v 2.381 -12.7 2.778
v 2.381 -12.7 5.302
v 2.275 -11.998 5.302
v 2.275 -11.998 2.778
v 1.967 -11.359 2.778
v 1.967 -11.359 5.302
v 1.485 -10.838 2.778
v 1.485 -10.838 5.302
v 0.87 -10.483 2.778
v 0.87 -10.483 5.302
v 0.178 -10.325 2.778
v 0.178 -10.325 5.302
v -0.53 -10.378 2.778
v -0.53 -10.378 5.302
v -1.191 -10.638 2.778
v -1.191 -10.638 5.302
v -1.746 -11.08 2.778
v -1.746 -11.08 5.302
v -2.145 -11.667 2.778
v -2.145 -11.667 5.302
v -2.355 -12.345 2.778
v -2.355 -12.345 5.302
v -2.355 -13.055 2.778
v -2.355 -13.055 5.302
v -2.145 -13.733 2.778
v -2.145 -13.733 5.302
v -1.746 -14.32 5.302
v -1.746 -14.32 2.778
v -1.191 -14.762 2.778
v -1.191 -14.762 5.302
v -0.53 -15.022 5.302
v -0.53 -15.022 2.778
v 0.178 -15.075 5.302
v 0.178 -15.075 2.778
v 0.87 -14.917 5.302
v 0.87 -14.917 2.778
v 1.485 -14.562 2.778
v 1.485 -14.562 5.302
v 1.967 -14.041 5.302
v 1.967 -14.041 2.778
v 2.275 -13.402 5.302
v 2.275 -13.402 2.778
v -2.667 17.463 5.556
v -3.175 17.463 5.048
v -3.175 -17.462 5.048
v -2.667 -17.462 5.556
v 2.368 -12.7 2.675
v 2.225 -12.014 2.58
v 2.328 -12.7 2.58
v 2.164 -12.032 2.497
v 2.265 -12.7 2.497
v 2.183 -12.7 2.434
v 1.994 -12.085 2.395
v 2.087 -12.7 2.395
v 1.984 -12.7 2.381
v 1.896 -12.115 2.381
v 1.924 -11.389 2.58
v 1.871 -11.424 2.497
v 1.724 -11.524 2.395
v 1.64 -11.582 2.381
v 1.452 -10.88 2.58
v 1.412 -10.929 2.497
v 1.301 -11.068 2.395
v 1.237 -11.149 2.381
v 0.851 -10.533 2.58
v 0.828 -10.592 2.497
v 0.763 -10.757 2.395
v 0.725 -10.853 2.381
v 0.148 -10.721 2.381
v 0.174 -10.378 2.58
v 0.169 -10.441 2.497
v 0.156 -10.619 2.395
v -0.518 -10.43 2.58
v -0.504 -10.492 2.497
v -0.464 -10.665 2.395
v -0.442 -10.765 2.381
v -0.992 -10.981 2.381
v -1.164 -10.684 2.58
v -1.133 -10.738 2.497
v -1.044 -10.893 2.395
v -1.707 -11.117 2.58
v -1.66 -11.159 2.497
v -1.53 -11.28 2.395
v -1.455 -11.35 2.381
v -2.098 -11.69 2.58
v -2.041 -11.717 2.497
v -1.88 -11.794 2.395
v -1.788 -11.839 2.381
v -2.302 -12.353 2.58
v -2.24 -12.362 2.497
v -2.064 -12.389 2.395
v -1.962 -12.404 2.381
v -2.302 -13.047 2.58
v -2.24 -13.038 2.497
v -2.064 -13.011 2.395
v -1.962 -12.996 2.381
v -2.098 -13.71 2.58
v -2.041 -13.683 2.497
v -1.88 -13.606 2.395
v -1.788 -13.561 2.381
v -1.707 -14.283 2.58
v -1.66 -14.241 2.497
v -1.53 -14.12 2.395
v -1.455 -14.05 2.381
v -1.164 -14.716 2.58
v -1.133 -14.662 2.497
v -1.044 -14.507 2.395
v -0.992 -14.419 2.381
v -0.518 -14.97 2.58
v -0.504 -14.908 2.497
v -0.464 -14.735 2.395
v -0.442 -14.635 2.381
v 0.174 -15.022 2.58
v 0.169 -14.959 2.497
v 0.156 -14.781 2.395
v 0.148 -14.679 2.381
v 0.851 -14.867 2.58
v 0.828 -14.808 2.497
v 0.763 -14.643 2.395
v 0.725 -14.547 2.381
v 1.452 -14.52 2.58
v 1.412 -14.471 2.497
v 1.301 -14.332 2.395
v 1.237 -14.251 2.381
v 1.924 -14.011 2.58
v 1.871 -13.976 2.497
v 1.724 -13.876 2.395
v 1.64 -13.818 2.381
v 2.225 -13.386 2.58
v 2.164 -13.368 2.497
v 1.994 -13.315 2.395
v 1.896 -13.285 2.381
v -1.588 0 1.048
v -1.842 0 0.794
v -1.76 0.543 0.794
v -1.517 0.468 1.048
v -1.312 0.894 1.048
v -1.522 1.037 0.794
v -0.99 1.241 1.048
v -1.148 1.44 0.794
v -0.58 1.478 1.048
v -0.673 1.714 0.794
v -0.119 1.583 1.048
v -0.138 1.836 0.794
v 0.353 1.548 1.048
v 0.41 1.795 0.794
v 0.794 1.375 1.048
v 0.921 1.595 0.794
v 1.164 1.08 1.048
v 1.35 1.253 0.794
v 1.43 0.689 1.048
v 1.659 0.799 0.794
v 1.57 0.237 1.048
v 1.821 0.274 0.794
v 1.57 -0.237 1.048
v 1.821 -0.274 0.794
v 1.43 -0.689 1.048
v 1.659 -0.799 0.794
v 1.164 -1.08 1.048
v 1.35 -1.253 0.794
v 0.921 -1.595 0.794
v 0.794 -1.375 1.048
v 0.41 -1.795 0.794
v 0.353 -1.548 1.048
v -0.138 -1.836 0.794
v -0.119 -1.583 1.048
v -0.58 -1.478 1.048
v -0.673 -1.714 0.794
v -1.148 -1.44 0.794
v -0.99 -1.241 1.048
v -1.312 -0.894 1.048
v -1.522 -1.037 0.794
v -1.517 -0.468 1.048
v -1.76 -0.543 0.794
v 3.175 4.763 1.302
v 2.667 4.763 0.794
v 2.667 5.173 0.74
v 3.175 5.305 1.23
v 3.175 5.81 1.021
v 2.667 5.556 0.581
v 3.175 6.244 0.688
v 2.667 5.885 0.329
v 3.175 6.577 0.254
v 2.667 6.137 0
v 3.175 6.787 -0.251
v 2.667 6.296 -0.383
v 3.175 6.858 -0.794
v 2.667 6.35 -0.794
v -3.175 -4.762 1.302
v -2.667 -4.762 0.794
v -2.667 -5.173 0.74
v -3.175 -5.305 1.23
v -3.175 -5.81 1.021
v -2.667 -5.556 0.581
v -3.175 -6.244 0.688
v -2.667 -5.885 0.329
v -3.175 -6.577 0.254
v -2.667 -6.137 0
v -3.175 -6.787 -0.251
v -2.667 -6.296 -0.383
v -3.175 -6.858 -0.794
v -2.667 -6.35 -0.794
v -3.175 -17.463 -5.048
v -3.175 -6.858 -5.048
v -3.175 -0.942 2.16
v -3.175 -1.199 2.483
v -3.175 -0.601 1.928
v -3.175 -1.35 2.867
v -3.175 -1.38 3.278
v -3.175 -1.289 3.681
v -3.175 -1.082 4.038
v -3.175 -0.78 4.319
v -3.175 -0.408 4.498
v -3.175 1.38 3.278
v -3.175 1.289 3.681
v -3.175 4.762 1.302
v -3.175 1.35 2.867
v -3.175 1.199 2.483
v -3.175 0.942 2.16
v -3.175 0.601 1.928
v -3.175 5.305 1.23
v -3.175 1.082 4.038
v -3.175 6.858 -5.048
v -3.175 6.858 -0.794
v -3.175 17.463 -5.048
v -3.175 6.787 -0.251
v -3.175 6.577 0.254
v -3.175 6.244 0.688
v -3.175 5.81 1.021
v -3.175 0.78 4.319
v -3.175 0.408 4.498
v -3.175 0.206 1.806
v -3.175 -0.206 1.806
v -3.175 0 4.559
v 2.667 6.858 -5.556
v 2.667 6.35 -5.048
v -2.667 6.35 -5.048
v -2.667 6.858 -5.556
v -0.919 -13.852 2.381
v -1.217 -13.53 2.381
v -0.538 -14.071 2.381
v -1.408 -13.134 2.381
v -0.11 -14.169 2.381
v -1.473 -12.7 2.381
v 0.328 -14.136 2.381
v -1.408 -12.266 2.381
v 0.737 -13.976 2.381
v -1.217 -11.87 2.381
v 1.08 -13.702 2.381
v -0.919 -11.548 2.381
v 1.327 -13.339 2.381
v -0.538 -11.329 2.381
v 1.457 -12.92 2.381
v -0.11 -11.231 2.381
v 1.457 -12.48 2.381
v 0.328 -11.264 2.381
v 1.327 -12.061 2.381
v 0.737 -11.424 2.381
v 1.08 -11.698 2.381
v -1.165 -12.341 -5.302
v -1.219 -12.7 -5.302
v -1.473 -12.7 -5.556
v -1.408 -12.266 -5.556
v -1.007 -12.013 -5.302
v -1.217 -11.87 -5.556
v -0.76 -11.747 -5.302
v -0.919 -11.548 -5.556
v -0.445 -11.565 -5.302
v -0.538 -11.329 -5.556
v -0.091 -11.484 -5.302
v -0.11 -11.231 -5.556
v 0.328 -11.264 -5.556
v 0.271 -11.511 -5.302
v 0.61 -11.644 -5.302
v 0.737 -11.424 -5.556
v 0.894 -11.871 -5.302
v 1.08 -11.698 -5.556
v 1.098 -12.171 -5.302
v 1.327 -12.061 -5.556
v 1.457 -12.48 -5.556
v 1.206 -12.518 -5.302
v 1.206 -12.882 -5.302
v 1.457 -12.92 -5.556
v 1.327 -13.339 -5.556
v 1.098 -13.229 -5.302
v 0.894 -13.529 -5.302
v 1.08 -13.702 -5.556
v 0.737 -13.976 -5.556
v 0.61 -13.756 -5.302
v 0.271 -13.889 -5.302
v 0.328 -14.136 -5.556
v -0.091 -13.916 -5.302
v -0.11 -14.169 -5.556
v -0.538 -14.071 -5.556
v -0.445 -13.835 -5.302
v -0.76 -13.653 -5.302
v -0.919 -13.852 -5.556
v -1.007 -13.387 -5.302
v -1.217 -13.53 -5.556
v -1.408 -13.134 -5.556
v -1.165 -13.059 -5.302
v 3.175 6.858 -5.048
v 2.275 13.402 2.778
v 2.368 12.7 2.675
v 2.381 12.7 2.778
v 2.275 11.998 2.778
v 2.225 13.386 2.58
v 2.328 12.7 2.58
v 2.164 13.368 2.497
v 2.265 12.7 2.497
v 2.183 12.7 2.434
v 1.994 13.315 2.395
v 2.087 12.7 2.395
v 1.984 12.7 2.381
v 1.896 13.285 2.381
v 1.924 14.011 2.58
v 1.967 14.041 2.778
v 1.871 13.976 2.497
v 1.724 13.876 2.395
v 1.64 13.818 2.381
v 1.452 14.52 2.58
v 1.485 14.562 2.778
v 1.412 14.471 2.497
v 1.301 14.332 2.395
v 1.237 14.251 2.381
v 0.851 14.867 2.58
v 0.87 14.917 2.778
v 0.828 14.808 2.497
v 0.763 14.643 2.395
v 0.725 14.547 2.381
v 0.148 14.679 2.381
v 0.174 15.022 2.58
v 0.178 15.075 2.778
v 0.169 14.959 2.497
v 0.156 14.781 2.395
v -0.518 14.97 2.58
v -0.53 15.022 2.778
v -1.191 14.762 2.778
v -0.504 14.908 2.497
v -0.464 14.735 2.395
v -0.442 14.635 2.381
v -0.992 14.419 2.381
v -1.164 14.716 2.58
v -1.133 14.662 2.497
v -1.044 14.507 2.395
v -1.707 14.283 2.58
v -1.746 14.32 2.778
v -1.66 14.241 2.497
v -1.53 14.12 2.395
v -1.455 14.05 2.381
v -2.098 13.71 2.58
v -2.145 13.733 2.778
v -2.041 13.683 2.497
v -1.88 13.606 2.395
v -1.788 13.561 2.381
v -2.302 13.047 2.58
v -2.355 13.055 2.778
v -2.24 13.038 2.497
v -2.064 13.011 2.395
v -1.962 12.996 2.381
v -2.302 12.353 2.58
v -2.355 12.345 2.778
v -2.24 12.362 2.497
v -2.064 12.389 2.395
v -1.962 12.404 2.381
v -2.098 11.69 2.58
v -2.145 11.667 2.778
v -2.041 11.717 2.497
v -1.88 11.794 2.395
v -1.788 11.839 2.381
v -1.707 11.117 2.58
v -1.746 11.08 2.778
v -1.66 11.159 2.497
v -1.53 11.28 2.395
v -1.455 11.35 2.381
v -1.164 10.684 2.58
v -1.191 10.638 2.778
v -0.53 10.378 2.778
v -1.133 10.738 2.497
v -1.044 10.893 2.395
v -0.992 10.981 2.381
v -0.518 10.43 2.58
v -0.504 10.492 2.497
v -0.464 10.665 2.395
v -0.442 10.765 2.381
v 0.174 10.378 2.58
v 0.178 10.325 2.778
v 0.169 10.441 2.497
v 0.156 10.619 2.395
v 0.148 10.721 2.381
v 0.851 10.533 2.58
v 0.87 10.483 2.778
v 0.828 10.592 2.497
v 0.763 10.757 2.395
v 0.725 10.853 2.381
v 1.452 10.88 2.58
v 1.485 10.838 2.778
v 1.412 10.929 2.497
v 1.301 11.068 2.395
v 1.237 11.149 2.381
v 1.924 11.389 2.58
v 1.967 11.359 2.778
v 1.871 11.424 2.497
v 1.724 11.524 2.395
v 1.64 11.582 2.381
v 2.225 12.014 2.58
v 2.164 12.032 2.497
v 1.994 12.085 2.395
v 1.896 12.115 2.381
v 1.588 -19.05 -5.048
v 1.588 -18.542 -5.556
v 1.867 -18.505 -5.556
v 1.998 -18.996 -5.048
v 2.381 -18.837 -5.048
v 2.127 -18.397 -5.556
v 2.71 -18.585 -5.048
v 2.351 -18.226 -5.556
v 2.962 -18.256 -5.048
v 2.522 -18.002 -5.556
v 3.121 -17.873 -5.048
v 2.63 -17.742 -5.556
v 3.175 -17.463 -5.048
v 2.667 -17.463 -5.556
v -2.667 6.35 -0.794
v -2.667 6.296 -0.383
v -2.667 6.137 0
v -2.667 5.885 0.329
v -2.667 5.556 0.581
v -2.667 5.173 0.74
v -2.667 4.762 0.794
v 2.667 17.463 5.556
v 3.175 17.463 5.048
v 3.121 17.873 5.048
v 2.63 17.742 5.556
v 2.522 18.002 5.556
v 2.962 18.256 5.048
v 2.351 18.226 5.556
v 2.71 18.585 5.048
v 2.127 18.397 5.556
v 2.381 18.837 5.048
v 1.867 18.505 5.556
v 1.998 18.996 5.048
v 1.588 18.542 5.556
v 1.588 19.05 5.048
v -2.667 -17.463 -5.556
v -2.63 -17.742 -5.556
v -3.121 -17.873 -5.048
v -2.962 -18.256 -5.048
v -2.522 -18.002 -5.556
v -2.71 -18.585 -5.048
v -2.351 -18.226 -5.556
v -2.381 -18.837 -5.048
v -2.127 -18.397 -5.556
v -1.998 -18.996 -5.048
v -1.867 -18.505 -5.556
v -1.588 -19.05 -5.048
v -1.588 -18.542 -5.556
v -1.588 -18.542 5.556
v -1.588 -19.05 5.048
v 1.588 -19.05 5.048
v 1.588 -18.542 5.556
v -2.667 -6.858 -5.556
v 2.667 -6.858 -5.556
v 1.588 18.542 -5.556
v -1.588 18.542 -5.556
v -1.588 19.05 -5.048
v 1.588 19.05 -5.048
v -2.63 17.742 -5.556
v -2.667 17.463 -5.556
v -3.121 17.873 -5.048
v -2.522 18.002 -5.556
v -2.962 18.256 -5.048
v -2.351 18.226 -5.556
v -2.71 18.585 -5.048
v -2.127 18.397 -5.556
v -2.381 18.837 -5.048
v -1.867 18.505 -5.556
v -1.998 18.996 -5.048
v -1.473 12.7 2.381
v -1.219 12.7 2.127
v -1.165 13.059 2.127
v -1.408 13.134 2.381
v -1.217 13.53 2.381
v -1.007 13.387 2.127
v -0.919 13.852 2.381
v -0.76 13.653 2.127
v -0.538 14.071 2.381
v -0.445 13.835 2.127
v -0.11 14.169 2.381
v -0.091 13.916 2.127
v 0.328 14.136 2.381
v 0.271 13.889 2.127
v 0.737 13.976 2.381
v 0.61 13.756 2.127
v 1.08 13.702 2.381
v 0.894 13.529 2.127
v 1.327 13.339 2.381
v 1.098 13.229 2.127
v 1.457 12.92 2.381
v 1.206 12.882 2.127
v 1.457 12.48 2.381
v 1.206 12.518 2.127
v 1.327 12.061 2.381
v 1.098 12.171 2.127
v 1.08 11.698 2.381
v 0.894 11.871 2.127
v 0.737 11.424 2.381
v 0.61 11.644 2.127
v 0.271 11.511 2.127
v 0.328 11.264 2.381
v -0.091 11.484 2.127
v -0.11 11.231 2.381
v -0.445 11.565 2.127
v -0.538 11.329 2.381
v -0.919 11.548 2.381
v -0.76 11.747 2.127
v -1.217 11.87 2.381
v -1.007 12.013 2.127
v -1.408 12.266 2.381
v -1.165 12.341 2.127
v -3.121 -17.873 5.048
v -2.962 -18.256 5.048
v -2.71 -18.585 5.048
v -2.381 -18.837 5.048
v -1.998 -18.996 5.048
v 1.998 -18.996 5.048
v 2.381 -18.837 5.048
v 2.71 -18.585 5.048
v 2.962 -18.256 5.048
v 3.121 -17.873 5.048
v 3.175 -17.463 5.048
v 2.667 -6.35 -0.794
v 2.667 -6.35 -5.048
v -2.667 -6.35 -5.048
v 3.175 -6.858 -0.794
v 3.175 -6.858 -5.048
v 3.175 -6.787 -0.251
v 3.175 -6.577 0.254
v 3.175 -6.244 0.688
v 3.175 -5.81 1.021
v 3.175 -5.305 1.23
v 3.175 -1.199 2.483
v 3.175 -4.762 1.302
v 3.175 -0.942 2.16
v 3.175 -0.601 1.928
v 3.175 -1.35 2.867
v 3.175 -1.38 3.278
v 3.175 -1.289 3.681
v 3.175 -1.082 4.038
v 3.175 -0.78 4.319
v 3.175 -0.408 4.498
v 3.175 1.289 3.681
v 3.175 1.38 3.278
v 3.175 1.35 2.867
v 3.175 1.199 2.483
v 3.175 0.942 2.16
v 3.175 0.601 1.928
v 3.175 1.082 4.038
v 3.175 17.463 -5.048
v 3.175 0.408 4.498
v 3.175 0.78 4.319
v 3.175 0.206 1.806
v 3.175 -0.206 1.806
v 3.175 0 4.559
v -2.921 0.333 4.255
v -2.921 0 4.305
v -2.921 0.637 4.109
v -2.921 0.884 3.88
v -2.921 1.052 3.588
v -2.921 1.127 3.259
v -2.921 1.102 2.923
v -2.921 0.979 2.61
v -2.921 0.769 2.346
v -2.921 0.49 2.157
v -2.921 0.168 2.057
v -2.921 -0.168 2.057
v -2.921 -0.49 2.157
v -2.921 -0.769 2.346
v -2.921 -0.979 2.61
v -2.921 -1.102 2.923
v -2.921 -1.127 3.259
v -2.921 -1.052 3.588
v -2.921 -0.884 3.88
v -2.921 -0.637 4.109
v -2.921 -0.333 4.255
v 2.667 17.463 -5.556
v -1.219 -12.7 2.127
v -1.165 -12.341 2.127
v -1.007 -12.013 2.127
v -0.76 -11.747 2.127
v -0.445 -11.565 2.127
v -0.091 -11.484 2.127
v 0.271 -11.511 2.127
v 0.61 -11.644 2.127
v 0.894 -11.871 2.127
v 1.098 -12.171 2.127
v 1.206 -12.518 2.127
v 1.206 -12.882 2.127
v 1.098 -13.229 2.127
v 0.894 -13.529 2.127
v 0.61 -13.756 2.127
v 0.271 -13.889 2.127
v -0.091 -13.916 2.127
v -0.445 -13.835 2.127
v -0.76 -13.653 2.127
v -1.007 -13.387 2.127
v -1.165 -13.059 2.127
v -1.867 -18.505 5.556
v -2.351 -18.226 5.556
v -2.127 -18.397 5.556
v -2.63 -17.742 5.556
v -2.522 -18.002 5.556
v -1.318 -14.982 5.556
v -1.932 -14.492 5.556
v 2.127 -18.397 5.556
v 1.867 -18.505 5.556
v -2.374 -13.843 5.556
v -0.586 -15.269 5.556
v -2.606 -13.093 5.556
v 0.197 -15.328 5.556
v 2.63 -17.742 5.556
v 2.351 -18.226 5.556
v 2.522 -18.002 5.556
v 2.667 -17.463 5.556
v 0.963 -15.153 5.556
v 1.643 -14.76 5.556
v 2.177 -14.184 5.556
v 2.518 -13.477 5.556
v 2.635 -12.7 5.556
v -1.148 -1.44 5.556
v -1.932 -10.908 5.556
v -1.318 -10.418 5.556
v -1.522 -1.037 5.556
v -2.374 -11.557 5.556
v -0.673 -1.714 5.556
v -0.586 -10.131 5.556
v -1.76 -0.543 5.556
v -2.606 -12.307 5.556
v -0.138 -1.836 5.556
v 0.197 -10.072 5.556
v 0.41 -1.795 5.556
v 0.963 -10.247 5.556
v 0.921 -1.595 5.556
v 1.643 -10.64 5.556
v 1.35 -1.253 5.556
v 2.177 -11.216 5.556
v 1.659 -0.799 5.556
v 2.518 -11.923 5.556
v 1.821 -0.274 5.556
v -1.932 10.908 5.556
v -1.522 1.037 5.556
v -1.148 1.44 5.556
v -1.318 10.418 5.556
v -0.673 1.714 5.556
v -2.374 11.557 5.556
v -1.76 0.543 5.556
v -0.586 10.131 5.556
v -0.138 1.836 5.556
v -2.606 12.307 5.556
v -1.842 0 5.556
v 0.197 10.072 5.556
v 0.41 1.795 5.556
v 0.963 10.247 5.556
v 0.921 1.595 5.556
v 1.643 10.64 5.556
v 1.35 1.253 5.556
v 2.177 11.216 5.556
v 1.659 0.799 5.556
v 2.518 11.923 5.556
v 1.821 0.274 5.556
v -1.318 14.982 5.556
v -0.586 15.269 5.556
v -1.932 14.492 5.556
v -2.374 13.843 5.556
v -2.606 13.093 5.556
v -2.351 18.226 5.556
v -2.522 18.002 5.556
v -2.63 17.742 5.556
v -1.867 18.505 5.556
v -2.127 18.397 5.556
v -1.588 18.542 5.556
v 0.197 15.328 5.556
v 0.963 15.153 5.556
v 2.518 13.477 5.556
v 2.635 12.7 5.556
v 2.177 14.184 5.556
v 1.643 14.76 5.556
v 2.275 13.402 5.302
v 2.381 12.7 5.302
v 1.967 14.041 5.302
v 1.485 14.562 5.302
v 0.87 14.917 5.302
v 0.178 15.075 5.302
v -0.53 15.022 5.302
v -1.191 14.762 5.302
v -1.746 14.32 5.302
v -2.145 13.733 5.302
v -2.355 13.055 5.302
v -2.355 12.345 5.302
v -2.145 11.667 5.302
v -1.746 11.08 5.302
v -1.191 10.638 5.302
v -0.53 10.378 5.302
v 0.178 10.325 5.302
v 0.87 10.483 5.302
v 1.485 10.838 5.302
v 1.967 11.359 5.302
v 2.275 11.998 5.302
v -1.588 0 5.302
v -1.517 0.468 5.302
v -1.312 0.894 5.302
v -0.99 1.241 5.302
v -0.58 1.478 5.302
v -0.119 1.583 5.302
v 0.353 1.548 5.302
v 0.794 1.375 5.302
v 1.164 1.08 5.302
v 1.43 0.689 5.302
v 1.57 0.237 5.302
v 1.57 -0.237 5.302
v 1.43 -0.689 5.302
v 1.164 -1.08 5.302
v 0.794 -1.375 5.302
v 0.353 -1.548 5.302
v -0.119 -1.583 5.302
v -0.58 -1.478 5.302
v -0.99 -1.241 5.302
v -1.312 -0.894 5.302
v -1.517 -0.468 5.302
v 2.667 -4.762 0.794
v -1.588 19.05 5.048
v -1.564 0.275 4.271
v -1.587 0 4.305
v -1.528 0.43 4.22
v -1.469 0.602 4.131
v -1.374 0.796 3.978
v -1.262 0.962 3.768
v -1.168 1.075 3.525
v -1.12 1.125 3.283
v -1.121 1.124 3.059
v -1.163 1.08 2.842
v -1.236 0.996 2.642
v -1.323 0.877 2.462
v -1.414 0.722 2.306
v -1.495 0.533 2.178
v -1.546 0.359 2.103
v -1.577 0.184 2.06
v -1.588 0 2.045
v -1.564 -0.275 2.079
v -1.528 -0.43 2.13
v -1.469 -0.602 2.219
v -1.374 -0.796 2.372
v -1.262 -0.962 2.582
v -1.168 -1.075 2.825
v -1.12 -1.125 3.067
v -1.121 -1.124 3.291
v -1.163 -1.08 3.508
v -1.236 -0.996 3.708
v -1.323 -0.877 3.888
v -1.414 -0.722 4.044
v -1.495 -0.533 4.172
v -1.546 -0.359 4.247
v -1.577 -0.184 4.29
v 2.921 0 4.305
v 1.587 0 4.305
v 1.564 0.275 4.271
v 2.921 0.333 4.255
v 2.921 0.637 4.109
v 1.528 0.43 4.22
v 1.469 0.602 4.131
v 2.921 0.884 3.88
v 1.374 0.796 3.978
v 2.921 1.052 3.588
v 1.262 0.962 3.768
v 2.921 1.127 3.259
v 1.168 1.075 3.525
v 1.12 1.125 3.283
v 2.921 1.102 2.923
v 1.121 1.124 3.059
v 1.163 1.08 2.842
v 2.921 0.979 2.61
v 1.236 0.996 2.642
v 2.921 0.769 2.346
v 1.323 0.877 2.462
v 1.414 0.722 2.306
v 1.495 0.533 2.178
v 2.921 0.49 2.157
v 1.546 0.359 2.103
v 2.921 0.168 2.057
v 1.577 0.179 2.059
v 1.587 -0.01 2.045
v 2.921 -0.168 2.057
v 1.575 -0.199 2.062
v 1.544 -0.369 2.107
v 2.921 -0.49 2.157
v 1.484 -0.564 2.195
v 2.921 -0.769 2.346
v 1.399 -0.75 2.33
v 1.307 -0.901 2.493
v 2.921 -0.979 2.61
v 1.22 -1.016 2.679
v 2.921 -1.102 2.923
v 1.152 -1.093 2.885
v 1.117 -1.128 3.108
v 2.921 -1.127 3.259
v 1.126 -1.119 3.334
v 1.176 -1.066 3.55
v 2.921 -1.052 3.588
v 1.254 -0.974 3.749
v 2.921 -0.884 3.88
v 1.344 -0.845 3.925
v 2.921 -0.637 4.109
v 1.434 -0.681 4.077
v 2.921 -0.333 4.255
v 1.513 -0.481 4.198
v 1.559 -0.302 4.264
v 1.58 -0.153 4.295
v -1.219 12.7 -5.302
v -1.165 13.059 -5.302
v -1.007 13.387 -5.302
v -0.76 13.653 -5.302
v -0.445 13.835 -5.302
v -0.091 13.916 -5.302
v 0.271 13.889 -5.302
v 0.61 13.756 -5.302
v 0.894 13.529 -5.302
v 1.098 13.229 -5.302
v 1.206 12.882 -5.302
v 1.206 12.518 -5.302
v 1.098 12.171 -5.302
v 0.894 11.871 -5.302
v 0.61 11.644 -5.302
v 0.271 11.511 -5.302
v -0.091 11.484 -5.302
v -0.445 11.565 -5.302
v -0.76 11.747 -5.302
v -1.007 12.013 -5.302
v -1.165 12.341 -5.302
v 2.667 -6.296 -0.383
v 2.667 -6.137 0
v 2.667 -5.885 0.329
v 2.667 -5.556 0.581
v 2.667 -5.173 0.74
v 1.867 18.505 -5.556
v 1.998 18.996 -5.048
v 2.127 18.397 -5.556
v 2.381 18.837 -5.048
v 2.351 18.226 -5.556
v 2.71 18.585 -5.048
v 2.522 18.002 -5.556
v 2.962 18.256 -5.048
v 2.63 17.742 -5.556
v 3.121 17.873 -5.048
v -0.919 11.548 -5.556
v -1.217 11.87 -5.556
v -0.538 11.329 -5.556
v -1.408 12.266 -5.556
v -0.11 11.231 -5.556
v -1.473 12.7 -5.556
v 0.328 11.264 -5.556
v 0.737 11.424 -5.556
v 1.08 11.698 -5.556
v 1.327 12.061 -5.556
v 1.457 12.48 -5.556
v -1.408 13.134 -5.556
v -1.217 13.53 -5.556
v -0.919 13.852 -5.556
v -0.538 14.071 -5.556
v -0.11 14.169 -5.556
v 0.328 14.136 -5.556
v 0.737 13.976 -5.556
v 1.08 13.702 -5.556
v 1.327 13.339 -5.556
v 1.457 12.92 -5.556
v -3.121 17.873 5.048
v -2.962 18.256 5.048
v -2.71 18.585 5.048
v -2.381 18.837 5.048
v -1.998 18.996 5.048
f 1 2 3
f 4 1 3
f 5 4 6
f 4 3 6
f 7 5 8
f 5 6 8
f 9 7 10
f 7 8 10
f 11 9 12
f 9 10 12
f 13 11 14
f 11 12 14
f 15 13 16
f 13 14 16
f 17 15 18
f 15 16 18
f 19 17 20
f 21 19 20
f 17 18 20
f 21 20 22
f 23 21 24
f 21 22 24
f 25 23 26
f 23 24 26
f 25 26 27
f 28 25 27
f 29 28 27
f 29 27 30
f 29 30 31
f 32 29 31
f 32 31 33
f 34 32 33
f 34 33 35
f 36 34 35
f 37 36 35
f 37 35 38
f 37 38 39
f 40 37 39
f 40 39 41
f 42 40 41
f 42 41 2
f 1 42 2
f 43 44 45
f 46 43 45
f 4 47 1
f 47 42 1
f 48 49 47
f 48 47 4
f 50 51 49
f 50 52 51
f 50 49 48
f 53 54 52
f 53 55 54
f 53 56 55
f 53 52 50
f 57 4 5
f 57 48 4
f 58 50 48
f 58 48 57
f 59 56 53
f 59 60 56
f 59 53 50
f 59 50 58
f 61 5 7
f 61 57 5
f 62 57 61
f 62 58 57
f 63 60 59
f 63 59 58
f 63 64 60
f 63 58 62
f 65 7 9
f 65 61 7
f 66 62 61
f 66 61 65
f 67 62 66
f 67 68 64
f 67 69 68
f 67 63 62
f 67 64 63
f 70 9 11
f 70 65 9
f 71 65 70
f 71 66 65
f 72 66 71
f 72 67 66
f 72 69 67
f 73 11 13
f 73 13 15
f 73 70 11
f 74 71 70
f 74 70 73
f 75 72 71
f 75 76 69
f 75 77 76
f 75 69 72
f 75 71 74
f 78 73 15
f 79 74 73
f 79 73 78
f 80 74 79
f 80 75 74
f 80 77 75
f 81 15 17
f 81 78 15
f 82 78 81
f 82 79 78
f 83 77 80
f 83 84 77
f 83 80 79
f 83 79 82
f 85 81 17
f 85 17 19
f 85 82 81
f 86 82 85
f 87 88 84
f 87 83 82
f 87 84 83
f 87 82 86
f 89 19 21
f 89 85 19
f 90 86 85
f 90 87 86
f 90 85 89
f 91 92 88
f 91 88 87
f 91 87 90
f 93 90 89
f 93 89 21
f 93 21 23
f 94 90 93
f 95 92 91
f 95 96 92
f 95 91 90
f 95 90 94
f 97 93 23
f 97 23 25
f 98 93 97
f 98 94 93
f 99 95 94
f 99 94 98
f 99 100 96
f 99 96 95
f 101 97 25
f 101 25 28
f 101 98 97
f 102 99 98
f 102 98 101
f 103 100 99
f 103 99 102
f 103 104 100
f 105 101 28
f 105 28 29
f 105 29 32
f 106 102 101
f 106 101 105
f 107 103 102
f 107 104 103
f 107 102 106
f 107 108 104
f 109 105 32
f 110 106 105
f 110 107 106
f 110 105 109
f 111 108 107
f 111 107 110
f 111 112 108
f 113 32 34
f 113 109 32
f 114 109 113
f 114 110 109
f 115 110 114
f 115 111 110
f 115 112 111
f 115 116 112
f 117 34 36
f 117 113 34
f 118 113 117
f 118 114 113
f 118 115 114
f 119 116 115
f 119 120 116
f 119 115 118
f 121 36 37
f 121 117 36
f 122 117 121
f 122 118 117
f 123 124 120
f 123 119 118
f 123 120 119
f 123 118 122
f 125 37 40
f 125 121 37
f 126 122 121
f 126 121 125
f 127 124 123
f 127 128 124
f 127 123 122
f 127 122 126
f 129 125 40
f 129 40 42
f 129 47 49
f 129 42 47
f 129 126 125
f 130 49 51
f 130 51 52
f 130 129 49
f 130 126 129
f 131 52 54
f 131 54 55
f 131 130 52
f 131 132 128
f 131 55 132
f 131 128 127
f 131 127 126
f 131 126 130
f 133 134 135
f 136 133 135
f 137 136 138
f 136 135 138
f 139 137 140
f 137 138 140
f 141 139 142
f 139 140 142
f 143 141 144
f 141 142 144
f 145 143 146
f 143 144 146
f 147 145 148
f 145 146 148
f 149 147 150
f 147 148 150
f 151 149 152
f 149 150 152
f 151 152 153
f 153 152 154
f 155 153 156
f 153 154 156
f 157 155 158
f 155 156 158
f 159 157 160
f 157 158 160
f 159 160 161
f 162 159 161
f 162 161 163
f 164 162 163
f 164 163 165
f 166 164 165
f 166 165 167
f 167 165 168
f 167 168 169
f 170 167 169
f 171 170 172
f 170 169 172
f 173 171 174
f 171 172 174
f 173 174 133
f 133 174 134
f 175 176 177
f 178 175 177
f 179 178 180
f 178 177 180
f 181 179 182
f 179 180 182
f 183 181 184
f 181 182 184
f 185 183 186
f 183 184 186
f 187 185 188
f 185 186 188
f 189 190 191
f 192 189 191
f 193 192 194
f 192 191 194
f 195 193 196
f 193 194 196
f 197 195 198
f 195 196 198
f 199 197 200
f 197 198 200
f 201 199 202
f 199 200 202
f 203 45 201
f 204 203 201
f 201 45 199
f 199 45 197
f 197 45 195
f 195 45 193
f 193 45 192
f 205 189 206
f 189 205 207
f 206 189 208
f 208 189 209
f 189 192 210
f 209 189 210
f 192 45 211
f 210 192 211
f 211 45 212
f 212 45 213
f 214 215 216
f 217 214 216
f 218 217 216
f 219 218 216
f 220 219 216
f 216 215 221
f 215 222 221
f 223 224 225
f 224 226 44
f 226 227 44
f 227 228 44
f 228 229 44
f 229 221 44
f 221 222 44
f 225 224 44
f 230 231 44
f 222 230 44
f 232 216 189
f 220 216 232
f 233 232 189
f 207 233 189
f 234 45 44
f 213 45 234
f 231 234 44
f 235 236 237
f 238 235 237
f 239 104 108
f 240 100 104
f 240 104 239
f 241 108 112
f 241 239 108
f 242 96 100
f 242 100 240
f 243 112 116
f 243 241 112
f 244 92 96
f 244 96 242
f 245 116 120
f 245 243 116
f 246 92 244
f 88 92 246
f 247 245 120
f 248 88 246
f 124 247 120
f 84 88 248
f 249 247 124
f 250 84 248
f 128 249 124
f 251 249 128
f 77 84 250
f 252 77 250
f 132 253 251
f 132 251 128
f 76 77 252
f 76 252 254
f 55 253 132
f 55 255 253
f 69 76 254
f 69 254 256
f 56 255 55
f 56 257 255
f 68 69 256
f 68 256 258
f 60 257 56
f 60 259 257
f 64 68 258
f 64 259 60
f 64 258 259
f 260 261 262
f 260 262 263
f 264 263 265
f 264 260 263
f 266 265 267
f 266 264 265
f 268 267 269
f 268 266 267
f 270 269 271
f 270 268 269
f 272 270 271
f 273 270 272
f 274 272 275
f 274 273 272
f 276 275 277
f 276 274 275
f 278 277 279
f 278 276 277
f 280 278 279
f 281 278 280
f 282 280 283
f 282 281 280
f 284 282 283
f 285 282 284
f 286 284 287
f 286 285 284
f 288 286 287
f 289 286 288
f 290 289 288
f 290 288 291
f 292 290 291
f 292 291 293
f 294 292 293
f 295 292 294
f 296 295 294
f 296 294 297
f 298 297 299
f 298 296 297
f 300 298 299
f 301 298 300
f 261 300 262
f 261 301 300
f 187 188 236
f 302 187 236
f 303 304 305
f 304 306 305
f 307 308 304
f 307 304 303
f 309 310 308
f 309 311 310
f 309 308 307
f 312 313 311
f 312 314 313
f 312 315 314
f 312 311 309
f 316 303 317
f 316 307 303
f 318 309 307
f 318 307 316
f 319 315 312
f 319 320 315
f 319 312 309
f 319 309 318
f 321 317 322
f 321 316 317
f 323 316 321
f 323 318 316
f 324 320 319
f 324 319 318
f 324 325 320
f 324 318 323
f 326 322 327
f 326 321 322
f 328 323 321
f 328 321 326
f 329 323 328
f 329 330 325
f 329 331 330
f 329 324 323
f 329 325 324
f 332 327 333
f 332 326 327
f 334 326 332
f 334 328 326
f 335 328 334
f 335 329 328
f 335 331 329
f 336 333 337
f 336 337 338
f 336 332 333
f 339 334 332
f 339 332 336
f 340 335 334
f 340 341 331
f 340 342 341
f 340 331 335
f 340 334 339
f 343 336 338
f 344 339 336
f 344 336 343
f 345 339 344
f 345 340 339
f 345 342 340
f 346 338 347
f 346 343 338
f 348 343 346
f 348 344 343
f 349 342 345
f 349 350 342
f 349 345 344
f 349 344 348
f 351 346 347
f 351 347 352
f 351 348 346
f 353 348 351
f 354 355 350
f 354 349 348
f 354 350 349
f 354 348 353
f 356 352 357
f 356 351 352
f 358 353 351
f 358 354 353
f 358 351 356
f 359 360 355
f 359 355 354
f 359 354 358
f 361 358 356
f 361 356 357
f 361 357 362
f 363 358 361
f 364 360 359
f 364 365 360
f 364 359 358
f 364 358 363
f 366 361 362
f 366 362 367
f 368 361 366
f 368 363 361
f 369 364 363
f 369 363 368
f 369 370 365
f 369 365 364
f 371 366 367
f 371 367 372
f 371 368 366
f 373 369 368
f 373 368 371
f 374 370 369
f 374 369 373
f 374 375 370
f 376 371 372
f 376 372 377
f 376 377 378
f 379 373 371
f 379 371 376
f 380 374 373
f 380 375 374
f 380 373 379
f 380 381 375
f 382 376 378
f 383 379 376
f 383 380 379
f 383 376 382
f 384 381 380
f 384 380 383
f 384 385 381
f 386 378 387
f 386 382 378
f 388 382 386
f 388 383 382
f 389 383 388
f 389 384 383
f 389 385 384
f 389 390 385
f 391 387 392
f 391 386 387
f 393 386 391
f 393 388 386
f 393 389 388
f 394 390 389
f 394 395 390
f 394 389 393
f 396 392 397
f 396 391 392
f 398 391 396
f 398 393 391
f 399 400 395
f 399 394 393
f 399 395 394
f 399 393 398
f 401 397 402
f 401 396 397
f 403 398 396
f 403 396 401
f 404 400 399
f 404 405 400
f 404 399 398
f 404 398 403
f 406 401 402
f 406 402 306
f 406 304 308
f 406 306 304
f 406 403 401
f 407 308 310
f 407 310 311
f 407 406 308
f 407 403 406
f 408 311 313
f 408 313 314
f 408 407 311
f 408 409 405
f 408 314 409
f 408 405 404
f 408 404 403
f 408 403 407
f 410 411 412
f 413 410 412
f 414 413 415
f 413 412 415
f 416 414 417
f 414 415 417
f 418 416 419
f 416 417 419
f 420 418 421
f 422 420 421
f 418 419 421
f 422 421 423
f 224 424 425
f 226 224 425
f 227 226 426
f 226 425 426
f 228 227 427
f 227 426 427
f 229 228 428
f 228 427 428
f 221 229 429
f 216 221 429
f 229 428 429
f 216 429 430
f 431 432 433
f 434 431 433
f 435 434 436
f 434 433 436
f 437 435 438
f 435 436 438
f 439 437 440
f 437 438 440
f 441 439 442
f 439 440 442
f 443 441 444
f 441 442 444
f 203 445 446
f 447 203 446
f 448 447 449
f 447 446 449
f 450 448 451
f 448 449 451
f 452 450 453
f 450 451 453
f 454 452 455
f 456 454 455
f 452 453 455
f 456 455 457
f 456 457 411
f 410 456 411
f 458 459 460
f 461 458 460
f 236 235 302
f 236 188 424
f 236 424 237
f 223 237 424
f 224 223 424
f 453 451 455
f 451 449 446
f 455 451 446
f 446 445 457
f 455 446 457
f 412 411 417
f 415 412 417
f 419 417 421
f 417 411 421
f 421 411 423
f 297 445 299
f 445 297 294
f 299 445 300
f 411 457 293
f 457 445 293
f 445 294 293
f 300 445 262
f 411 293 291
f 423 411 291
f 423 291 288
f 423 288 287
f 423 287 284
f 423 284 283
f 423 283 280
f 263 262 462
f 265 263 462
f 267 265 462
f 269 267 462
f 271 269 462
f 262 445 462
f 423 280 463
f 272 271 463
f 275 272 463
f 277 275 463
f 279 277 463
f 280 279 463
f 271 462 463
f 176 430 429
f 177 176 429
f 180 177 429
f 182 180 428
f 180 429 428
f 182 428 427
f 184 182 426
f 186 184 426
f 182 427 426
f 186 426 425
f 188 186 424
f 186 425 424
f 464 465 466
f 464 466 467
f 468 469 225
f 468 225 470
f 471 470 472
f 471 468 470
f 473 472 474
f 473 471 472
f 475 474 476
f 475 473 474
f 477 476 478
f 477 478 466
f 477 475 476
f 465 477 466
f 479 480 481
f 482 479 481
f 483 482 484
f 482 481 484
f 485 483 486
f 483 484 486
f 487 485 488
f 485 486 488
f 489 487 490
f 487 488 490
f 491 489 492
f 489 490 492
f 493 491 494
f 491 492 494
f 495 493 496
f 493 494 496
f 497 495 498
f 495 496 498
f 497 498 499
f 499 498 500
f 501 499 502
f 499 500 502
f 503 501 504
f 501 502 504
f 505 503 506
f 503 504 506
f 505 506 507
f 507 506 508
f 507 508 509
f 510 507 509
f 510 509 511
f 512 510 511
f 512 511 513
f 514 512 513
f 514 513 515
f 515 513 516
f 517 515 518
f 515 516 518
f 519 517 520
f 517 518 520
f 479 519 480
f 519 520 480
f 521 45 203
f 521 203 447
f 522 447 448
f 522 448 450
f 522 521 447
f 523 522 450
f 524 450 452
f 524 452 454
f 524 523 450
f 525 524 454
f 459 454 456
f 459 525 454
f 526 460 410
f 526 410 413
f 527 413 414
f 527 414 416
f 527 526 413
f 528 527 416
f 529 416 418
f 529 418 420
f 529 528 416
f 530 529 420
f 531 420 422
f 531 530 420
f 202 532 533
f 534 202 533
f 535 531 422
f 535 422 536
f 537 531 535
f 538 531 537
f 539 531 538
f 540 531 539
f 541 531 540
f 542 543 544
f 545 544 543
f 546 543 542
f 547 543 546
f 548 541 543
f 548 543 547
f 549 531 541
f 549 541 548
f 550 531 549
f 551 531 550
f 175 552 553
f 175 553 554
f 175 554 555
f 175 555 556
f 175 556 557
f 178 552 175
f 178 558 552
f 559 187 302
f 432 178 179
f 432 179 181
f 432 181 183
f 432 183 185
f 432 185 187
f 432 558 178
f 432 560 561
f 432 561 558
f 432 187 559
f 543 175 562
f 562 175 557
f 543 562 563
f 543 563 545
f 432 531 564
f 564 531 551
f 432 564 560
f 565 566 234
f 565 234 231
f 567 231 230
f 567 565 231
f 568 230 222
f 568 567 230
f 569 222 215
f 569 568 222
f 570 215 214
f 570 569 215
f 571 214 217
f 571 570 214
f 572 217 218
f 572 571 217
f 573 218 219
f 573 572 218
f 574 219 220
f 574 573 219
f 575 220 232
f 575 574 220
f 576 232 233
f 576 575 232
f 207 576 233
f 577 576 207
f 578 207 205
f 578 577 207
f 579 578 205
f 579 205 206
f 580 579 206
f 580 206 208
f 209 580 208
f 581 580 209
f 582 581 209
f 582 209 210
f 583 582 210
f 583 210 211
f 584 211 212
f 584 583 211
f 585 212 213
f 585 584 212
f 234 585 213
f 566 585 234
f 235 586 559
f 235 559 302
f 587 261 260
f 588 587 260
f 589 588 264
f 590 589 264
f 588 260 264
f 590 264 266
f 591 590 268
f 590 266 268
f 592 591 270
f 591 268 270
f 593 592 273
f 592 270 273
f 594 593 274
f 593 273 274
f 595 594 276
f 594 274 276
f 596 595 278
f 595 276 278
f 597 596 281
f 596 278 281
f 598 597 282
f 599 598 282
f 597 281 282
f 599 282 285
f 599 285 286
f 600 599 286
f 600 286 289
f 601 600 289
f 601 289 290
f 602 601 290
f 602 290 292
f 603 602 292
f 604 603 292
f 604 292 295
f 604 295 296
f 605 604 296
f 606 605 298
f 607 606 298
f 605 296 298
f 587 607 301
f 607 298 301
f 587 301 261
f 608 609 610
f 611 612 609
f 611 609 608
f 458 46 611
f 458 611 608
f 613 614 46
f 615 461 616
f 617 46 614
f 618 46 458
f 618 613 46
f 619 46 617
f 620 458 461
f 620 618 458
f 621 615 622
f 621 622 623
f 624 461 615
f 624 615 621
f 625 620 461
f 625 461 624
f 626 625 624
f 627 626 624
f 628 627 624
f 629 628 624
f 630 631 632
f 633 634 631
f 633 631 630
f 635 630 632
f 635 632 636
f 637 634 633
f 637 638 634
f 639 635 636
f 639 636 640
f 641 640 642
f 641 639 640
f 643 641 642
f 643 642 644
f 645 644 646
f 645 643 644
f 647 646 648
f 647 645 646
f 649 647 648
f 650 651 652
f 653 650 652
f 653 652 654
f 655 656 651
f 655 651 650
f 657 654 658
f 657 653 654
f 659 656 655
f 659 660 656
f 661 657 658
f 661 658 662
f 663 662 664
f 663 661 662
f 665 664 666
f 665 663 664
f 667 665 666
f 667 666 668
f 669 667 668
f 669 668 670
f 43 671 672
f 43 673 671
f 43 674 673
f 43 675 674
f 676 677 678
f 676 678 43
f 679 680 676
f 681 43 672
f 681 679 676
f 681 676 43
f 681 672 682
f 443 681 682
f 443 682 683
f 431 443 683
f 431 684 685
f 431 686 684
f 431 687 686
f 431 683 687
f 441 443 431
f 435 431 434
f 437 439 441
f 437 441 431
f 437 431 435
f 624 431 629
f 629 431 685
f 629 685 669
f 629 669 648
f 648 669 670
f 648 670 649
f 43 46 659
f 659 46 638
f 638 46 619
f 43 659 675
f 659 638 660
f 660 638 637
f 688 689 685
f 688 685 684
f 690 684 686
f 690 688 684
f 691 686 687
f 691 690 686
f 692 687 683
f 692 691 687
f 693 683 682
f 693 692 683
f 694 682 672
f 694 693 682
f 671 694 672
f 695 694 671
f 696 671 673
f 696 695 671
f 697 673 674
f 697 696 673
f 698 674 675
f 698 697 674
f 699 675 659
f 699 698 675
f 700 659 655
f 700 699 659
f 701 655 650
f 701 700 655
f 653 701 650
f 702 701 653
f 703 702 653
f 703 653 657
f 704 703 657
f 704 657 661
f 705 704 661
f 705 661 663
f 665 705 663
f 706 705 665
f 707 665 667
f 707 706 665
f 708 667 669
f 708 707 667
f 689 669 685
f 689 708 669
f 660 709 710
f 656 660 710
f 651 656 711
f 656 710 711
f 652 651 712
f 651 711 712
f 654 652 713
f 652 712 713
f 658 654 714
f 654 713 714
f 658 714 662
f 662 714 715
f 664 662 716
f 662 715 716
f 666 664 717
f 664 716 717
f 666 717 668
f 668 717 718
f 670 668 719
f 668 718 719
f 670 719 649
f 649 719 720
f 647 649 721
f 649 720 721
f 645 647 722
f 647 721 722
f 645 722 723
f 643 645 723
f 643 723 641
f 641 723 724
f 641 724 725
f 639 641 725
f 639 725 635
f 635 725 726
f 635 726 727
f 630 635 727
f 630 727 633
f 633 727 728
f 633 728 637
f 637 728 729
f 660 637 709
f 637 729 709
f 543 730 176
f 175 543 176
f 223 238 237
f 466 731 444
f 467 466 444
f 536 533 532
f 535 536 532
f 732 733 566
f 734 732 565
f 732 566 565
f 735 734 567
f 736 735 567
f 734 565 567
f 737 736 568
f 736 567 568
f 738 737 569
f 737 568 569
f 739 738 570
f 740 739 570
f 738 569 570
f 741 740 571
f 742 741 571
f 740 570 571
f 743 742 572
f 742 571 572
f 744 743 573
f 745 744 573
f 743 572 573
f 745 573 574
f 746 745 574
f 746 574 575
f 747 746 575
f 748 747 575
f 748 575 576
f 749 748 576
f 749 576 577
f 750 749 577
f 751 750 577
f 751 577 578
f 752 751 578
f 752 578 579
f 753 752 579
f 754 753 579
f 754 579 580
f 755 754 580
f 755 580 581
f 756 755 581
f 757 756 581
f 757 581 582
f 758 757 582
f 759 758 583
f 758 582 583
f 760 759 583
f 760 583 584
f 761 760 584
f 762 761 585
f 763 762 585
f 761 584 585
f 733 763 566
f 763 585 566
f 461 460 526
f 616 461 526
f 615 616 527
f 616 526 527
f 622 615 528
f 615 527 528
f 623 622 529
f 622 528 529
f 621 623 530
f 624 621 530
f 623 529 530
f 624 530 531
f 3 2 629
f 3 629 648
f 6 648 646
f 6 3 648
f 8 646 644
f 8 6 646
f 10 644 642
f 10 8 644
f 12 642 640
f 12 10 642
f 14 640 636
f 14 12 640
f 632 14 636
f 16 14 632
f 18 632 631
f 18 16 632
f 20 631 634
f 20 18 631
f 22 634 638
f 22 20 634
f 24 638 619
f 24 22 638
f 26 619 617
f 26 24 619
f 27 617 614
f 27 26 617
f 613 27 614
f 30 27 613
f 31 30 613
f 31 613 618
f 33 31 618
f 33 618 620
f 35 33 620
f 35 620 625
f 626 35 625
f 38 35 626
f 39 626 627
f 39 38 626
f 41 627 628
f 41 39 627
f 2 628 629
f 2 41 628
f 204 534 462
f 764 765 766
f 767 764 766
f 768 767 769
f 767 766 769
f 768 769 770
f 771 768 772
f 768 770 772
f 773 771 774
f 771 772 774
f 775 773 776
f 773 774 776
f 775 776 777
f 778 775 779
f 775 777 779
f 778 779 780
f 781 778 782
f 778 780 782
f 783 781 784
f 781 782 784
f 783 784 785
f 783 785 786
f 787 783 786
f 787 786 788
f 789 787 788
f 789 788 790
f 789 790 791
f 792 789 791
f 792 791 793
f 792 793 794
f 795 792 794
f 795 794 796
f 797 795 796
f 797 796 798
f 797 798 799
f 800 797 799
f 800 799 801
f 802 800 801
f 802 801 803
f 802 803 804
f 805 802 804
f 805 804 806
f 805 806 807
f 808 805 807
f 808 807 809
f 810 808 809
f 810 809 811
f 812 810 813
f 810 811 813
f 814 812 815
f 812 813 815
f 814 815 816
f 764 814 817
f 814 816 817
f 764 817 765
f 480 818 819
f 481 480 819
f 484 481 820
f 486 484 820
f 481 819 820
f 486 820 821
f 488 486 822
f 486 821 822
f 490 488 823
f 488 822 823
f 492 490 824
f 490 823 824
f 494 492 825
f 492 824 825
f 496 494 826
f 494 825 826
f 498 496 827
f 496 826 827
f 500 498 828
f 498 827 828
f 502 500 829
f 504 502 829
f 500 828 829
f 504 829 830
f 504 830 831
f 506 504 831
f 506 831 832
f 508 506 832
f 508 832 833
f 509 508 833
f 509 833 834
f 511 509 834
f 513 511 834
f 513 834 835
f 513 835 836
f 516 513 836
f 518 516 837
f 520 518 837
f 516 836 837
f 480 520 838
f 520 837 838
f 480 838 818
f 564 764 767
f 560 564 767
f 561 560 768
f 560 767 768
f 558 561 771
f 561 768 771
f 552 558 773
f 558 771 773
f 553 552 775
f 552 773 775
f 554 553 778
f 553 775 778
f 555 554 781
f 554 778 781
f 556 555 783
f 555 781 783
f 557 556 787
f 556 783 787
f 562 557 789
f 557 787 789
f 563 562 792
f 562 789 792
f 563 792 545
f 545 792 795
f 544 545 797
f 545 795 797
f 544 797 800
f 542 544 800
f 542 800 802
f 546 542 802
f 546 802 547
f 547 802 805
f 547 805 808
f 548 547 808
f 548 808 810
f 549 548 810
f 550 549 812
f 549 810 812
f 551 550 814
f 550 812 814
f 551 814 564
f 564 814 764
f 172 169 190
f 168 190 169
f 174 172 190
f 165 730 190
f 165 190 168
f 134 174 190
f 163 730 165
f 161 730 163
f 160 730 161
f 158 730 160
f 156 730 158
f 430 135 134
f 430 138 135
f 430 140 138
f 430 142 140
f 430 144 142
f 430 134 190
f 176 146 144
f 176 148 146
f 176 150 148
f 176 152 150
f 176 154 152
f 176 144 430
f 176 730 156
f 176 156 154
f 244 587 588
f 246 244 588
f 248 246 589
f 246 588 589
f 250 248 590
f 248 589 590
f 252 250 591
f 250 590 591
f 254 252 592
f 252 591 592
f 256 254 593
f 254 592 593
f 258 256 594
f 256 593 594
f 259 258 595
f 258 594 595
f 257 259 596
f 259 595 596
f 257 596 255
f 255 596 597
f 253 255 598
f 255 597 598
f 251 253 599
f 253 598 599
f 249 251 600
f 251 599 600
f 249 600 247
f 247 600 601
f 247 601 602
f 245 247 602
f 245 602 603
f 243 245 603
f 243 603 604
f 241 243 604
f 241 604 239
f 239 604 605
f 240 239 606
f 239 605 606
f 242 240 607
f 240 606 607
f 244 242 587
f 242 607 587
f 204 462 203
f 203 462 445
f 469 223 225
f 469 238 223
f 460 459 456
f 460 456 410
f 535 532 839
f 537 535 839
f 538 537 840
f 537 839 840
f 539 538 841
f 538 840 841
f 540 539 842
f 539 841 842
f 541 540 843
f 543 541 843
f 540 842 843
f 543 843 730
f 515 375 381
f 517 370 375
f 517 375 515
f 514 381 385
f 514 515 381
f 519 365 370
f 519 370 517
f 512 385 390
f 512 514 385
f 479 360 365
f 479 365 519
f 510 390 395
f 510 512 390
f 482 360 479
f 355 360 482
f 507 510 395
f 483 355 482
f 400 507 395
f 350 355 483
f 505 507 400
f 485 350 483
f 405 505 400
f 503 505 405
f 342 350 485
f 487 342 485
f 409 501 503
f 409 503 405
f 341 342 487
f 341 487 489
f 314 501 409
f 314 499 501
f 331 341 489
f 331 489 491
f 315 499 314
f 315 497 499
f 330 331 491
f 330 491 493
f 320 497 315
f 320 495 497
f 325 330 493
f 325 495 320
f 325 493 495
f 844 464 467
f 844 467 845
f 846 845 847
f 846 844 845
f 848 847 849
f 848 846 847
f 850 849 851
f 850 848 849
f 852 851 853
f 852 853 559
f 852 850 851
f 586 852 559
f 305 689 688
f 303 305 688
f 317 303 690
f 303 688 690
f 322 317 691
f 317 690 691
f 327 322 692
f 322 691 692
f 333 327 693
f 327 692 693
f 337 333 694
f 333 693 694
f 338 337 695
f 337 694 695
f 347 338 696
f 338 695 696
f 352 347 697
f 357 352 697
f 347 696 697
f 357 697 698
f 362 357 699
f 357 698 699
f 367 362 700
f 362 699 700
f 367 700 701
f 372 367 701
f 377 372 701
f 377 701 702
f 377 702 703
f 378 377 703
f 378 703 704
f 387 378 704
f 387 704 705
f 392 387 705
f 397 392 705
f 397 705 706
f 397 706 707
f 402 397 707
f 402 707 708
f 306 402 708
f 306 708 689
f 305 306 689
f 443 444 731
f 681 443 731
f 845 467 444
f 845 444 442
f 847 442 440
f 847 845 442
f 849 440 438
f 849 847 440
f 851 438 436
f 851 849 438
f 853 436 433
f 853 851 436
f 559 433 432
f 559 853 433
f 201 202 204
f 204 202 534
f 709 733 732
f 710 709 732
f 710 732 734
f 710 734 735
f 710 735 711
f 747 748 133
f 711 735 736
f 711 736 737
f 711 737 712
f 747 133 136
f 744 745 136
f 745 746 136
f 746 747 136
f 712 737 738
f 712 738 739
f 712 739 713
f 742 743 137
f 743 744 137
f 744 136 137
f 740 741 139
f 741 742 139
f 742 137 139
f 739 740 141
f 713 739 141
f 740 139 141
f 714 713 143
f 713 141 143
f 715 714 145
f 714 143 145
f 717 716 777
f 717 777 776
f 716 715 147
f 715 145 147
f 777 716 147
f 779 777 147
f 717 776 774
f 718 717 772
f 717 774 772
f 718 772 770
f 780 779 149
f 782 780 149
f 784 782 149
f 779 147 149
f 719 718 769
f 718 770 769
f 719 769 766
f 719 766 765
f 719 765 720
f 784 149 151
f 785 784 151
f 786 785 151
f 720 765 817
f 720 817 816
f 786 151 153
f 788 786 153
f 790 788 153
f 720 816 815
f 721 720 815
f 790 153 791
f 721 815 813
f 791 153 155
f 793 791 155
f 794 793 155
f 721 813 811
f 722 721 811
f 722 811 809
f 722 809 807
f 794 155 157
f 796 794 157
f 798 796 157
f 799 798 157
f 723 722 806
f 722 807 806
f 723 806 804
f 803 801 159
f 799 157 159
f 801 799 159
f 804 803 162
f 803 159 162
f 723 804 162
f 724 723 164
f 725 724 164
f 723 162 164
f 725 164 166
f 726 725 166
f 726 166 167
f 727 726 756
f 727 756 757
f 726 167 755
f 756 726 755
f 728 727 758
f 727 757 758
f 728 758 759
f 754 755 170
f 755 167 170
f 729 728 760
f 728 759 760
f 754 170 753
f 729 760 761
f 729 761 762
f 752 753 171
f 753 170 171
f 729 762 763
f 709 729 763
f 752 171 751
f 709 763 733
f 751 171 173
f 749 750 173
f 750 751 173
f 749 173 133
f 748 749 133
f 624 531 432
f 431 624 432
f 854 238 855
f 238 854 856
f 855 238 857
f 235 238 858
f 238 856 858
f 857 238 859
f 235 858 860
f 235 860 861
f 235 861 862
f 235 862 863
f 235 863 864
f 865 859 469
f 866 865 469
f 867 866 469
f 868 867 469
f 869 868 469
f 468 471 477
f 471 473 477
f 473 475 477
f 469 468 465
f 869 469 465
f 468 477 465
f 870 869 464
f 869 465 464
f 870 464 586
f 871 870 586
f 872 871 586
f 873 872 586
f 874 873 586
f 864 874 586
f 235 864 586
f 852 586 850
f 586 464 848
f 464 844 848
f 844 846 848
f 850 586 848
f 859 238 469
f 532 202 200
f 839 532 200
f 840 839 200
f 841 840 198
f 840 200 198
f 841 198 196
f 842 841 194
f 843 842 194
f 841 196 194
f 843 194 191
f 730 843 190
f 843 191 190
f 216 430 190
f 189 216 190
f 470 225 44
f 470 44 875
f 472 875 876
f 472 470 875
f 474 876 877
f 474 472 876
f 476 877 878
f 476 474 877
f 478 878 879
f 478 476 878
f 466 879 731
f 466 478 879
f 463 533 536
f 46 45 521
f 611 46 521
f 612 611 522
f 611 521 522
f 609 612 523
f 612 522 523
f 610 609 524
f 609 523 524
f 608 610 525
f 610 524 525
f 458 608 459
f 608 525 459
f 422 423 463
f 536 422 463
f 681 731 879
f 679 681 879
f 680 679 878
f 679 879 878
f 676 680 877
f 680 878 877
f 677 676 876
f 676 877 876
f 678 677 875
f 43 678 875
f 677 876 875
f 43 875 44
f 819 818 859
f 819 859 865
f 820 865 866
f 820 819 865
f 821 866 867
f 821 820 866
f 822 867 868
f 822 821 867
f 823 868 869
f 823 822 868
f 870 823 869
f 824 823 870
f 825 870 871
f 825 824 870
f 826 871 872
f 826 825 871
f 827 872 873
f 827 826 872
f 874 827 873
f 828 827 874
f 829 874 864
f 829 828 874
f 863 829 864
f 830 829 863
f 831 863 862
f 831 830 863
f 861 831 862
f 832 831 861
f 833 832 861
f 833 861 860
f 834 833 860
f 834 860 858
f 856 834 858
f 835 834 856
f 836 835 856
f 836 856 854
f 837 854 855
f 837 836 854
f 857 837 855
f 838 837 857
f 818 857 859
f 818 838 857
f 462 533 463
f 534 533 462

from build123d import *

# Parameters (mm, degrees)
SKETCH1_W                                           = 6.35
SKETCH1_H                                           = 38.1
BOSS_EXTRUDE1_DEPTH                                 = 5.55625
SKETCH8_W                                           = 6.35
SKETCH8_H                                           = 12.7
CUT_EXTRUDE1_DEPTH                                  = 4.175
CUT_EXTRUDE1_DEPTH_BACK                             = 4.175
F_1_8_0_125_DIAMETER_HOLE1_D                        = 3.175
CBORE_FOR_2_BINDING_HEAD_MACHINE_SCREW2_D           = 2.4384
CBORE_FOR_2_BINDING_HEAD_MACHINE_SCREW2_CBORE_D     = 4.7625
CBORE_FOR_2_BINDING_HEAD_MACHINE_SCREW2_CBORE_DEPTH = 3.175
F_4_40_TAPPED_HOLE1_D                               = 2.2606
FILLET1_R                                           = 1.5875
FILLET2_R                                           = 0.396875
CHAMFER1_SIZE                                       = 0.508
CHAMFER2_SIZE                                       = 0.254


with BuildPart() as part:
    # Sketch1 → Boss-Extrude1 (new body, symmetric)
    with BuildSketch(Plane.XY):
        Rectangle(SKETCH1_W, SKETCH1_H)
    extrude(amount=BOSS_EXTRUDE1_DEPTH, both=True)

    # Sketch8 → Cut-Extrude1 (cut, two sides)
    with BuildSketch(Plane(origin=(0, 0, 0), x_dir=(0, 0, -1), z_dir=(1, 0, 0))) as cut_extrude1_sk:
        with Locations((2.38125, 0)):
            Rectangle(SKETCH8_W, SKETCH8_H)
    extrude(amount=CUT_EXTRUDE1_DEPTH, mode=Mode.SUBTRACT)
    extrude(cut_extrude1_sk.sketch, amount=-CUT_EXTRUDE1_DEPTH_BACK, mode=Mode.SUBTRACT)

    # 1/8 (0.125) Diameter Hole1 (through all)
    with Locations(Plane.XY.offset(5.55625)):
        with Locations((0, 0)):
            Hole(F_1_8_0_125_DIAMETER_HOLE1_D / 2)

    # CBORE for #2 Binding Head Machine Screw2 (through all)
    with Locations(Plane.XY.offset(5.55625)):
        with Locations((0, 12.7), (0, -12.7)):
            CounterBoreHole(CBORE_FOR_2_BINDING_HEAD_MACHINE_SCREW2_D / 2, CBORE_FOR_2_BINDING_HEAD_MACHINE_SCREW2_CBORE_D / 2, CBORE_FOR_2_BINDING_HEAD_MACHINE_SCREW2_CBORE_DEPTH)

    # #4-40 Tapped Hole1 (through all)
    with Locations(Plane(origin=(3.175, 0, 0), x_dir=(0, 0, -1), z_dir=(1, 0, 0))):
        with Locations((-3.175, 0)):
            Hole(F_4_40_TAPPED_HOLE1_D / 2)

    # Fillet1
    fillet1_edges = [part.edges().sort_by_distance(p)[0] for p in [
        (0, -6.35, 0.79375),
        (0, 6.35, 0.79375),
        (-3.175, -19.05, 0),
        (3.175, -19.05, 0),
        (3.175, 19.05, 0),
        (-3.175, 19.05, 0),
    ]]
    fillet(fillet1_edges, radius=FILLET1_R)

    # Fillet2
    fillet2_edges = [part.edges().sort_by_distance(p)[0] for p in [
        (-2.38125, -12.7, 2.38125),
        (-2.38125, 12.7, 2.38125),
    ]]
    fillet(fillet2_edges, radius=FILLET2_R)

    # Chamfer1
    chamfer1_edges = [part.edges().sort_by_distance(p)[0] for p in [
        (-3.175, 11.90625, -5.55625),
        (3.175, 11.90625, -5.55625),
        (0, 6.35, -5.55625),
        (0, -6.35, -5.55625),
        (-3.175, -6.35, -3.175),
        (3.175, -6.35, -3.175),
        (-3.175, 0, 0.79375),
        (3.175, 0, 0.79375),
        (-3.175, 6.35, -3.175),
        (3.175, 6.35, -3.175),
        (0, -19.05, -5.55625),
        (0, -19.05, 5.55625),
        (3.175, -11.90625, -5.55625),
        (-3.175, -11.90625, -5.55625),
        (2.710032015, -18.585032015, -5.55625),
        (-2.710032015, -18.585032015, -5.55625),
        (-3.175, 0, 5.55625),
        (3.175, 0, 5.55625),
        (0, 19.05, 5.55625),
        (2.710032015, 18.585032015, 5.55625),
        (-2.710032015, 18.585032015, 5.55625),
        (2.710032015, -18.585032015, 5.55625),
        (-2.710032015, -18.585032015, 5.55625),
        (0, 19.05, -5.55625),
        (2.710032015, 18.585032015, -5.55625),
        (-2.710032015, 18.585032015, -5.55625),
        (3.175, -5.885032015, 0.328782015),
        (-3.175, -5.885032015, 0.328782015),
        (3.175, 5.885032015, 0.328782015),
        (-3.175, 5.885032015, 0.328782015),
    ]]
    chamfer(chamfer1_edges, length=CHAMFER1_SIZE)

    # Chamfer2
    chamfer2_edges = [part.edges().sort_by_distance(p)[0] for p in [
        (1.5875, 0, 0.79375),
        (1.5875, 0, 5.55625),
        (-2.38125, -12.7, 5.55625),
        (1.2192, -12.7, -5.55625),
        (1.2192, -12.7, 2.38125),
        (-2.38125, 12.7, 5.55625),
        (1.2192, 12.7, -5.55625),
        (1.2192, 12.7, 2.38125),
        (-3.175, 0, 2.0447),
        (3.175, 0, 2.0447),
    ]]
    chamfer(chamfer2_edges, length=CHAMFER2_SIZE)


solid = part.part
